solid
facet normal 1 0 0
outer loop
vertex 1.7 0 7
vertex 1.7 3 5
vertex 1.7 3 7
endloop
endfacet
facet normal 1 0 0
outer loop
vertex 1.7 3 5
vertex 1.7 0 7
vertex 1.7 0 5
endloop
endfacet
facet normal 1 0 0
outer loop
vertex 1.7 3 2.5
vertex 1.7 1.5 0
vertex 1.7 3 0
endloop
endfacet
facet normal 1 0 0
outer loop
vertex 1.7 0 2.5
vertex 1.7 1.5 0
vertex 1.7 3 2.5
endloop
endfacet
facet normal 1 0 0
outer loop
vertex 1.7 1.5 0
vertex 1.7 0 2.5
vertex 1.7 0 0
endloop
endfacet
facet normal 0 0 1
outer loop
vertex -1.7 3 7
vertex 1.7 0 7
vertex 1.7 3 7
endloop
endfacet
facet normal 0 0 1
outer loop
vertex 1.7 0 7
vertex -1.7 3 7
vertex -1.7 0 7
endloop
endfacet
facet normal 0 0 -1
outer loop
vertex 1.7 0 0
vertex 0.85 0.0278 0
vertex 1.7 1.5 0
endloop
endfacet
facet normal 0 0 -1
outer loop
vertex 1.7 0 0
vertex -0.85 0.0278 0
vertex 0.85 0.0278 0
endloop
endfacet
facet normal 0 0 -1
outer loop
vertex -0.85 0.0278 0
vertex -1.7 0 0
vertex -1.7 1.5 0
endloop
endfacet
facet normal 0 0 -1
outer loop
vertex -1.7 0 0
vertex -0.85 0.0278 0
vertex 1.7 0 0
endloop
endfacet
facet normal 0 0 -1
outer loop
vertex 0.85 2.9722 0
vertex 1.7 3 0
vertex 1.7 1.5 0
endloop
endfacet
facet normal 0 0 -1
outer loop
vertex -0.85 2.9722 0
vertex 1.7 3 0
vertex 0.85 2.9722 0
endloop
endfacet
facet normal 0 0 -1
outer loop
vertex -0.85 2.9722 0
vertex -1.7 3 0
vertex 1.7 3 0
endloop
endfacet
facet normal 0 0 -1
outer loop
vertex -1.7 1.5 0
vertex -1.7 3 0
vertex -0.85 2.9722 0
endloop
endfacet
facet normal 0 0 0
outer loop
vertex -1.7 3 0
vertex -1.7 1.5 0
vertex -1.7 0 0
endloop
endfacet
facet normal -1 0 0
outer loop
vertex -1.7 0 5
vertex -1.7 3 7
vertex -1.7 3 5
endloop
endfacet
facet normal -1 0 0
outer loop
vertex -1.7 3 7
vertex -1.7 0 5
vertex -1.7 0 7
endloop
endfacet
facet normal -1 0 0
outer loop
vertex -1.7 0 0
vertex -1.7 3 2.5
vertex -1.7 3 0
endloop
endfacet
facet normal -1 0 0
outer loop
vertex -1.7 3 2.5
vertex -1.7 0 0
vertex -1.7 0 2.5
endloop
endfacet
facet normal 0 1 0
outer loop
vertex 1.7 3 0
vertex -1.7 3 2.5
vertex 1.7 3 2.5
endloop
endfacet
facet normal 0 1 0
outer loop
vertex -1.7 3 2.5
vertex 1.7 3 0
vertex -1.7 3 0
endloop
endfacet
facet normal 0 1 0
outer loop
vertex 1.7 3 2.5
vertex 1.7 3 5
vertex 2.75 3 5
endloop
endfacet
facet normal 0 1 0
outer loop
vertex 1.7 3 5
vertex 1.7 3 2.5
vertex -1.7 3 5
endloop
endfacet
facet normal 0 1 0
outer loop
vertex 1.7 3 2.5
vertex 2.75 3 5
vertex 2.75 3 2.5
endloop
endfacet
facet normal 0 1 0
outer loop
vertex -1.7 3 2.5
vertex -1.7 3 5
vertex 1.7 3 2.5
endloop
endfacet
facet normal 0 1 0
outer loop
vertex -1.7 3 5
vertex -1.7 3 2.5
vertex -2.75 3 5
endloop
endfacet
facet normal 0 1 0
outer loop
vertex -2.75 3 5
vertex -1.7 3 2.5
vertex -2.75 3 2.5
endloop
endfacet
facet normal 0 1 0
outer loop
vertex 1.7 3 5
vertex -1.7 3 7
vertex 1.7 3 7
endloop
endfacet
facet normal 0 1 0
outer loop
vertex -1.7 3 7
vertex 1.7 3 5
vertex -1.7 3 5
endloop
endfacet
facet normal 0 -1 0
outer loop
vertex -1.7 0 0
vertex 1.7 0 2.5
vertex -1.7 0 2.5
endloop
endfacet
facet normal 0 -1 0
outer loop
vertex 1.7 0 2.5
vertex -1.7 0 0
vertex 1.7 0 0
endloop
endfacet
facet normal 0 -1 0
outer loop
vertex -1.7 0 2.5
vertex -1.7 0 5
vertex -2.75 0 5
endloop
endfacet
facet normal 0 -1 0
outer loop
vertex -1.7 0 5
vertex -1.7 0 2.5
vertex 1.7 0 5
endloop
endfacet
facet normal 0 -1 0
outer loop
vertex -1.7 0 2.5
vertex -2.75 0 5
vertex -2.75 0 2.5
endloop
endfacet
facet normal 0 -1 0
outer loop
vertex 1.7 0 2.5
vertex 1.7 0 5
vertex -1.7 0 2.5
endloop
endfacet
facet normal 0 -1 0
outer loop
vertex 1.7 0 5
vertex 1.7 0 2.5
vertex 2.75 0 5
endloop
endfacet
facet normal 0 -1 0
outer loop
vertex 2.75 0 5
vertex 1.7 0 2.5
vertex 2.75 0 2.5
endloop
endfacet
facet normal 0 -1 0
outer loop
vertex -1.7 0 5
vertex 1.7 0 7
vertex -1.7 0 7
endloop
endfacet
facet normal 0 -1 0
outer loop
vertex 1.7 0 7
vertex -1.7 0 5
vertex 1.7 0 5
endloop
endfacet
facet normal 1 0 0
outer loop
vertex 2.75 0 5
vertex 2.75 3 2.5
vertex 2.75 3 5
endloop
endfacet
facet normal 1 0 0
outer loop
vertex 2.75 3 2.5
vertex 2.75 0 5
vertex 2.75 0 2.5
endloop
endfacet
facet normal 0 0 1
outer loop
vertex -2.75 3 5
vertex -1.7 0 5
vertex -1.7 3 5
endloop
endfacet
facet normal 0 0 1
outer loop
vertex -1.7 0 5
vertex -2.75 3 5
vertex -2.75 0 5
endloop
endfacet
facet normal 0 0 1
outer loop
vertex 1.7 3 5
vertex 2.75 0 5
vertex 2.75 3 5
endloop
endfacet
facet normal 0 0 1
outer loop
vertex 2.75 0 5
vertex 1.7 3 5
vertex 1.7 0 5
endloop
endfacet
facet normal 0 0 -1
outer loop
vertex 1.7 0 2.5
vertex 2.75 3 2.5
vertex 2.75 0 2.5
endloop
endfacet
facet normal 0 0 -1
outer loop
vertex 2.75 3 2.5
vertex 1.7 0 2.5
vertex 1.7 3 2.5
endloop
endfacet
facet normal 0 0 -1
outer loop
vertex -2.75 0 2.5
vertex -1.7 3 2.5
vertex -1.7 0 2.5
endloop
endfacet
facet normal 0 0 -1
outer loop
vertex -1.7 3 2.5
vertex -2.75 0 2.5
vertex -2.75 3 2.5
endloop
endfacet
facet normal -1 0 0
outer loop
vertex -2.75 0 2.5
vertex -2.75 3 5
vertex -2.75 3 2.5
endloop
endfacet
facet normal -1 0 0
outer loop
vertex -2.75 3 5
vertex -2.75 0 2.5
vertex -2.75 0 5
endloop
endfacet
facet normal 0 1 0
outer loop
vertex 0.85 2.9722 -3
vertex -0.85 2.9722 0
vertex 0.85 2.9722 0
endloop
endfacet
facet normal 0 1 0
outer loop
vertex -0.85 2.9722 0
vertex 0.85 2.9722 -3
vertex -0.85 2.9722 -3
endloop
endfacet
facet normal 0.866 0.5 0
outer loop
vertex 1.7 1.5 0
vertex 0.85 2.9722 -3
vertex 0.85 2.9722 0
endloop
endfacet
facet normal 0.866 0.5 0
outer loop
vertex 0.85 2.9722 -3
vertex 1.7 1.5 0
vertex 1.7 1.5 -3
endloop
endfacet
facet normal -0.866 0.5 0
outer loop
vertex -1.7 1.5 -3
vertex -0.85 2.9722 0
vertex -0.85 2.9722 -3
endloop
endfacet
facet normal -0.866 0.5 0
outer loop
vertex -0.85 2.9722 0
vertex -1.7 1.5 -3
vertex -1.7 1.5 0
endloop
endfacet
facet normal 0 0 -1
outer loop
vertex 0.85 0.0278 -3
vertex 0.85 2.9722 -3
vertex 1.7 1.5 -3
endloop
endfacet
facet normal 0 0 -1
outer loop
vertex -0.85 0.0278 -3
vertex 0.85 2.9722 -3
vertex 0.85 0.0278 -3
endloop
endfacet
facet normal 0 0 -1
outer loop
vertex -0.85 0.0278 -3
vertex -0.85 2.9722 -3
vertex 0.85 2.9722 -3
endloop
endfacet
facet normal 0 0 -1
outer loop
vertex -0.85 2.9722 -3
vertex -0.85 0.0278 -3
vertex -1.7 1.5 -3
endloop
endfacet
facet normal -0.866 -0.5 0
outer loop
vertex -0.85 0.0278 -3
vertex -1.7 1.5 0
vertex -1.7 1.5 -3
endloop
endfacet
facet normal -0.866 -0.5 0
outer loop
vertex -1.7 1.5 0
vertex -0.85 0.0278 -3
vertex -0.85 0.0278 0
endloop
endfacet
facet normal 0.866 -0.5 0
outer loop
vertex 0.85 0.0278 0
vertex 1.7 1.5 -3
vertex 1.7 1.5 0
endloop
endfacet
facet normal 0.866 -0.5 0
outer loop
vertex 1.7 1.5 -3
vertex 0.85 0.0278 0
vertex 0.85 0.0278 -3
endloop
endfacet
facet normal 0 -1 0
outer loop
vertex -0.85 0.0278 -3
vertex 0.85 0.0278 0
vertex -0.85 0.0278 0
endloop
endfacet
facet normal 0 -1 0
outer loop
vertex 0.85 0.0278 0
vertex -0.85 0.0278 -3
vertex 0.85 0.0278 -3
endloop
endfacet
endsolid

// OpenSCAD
module createTJoint(materialThickness, boltWidth, boltHeight, nutWidth, nutHeight, endspacing = 2) {
    translate([-(boltWidth / 2), 0, 0]) {
        translate([(boltWidth / 2) - (nutWidth / 2), 0, 0]) {
            cube([nutWidth, materialThickness, nutHeight]);
        }
        
        translate([0, 0, nutHeight - endspacing - boltHeight]) {
            cube([boltWidth, materialThickness, boltHeight]);
        }
    }
    
    translate([0, (materialThickness / 2), -materialThickness]) {
        cylinder(materialThickness, d=nutWidth, true);
    }
}

// Remember bit.ly/holesize

createTJoint(3, 5.5, 2.5, 3.4, 7);
